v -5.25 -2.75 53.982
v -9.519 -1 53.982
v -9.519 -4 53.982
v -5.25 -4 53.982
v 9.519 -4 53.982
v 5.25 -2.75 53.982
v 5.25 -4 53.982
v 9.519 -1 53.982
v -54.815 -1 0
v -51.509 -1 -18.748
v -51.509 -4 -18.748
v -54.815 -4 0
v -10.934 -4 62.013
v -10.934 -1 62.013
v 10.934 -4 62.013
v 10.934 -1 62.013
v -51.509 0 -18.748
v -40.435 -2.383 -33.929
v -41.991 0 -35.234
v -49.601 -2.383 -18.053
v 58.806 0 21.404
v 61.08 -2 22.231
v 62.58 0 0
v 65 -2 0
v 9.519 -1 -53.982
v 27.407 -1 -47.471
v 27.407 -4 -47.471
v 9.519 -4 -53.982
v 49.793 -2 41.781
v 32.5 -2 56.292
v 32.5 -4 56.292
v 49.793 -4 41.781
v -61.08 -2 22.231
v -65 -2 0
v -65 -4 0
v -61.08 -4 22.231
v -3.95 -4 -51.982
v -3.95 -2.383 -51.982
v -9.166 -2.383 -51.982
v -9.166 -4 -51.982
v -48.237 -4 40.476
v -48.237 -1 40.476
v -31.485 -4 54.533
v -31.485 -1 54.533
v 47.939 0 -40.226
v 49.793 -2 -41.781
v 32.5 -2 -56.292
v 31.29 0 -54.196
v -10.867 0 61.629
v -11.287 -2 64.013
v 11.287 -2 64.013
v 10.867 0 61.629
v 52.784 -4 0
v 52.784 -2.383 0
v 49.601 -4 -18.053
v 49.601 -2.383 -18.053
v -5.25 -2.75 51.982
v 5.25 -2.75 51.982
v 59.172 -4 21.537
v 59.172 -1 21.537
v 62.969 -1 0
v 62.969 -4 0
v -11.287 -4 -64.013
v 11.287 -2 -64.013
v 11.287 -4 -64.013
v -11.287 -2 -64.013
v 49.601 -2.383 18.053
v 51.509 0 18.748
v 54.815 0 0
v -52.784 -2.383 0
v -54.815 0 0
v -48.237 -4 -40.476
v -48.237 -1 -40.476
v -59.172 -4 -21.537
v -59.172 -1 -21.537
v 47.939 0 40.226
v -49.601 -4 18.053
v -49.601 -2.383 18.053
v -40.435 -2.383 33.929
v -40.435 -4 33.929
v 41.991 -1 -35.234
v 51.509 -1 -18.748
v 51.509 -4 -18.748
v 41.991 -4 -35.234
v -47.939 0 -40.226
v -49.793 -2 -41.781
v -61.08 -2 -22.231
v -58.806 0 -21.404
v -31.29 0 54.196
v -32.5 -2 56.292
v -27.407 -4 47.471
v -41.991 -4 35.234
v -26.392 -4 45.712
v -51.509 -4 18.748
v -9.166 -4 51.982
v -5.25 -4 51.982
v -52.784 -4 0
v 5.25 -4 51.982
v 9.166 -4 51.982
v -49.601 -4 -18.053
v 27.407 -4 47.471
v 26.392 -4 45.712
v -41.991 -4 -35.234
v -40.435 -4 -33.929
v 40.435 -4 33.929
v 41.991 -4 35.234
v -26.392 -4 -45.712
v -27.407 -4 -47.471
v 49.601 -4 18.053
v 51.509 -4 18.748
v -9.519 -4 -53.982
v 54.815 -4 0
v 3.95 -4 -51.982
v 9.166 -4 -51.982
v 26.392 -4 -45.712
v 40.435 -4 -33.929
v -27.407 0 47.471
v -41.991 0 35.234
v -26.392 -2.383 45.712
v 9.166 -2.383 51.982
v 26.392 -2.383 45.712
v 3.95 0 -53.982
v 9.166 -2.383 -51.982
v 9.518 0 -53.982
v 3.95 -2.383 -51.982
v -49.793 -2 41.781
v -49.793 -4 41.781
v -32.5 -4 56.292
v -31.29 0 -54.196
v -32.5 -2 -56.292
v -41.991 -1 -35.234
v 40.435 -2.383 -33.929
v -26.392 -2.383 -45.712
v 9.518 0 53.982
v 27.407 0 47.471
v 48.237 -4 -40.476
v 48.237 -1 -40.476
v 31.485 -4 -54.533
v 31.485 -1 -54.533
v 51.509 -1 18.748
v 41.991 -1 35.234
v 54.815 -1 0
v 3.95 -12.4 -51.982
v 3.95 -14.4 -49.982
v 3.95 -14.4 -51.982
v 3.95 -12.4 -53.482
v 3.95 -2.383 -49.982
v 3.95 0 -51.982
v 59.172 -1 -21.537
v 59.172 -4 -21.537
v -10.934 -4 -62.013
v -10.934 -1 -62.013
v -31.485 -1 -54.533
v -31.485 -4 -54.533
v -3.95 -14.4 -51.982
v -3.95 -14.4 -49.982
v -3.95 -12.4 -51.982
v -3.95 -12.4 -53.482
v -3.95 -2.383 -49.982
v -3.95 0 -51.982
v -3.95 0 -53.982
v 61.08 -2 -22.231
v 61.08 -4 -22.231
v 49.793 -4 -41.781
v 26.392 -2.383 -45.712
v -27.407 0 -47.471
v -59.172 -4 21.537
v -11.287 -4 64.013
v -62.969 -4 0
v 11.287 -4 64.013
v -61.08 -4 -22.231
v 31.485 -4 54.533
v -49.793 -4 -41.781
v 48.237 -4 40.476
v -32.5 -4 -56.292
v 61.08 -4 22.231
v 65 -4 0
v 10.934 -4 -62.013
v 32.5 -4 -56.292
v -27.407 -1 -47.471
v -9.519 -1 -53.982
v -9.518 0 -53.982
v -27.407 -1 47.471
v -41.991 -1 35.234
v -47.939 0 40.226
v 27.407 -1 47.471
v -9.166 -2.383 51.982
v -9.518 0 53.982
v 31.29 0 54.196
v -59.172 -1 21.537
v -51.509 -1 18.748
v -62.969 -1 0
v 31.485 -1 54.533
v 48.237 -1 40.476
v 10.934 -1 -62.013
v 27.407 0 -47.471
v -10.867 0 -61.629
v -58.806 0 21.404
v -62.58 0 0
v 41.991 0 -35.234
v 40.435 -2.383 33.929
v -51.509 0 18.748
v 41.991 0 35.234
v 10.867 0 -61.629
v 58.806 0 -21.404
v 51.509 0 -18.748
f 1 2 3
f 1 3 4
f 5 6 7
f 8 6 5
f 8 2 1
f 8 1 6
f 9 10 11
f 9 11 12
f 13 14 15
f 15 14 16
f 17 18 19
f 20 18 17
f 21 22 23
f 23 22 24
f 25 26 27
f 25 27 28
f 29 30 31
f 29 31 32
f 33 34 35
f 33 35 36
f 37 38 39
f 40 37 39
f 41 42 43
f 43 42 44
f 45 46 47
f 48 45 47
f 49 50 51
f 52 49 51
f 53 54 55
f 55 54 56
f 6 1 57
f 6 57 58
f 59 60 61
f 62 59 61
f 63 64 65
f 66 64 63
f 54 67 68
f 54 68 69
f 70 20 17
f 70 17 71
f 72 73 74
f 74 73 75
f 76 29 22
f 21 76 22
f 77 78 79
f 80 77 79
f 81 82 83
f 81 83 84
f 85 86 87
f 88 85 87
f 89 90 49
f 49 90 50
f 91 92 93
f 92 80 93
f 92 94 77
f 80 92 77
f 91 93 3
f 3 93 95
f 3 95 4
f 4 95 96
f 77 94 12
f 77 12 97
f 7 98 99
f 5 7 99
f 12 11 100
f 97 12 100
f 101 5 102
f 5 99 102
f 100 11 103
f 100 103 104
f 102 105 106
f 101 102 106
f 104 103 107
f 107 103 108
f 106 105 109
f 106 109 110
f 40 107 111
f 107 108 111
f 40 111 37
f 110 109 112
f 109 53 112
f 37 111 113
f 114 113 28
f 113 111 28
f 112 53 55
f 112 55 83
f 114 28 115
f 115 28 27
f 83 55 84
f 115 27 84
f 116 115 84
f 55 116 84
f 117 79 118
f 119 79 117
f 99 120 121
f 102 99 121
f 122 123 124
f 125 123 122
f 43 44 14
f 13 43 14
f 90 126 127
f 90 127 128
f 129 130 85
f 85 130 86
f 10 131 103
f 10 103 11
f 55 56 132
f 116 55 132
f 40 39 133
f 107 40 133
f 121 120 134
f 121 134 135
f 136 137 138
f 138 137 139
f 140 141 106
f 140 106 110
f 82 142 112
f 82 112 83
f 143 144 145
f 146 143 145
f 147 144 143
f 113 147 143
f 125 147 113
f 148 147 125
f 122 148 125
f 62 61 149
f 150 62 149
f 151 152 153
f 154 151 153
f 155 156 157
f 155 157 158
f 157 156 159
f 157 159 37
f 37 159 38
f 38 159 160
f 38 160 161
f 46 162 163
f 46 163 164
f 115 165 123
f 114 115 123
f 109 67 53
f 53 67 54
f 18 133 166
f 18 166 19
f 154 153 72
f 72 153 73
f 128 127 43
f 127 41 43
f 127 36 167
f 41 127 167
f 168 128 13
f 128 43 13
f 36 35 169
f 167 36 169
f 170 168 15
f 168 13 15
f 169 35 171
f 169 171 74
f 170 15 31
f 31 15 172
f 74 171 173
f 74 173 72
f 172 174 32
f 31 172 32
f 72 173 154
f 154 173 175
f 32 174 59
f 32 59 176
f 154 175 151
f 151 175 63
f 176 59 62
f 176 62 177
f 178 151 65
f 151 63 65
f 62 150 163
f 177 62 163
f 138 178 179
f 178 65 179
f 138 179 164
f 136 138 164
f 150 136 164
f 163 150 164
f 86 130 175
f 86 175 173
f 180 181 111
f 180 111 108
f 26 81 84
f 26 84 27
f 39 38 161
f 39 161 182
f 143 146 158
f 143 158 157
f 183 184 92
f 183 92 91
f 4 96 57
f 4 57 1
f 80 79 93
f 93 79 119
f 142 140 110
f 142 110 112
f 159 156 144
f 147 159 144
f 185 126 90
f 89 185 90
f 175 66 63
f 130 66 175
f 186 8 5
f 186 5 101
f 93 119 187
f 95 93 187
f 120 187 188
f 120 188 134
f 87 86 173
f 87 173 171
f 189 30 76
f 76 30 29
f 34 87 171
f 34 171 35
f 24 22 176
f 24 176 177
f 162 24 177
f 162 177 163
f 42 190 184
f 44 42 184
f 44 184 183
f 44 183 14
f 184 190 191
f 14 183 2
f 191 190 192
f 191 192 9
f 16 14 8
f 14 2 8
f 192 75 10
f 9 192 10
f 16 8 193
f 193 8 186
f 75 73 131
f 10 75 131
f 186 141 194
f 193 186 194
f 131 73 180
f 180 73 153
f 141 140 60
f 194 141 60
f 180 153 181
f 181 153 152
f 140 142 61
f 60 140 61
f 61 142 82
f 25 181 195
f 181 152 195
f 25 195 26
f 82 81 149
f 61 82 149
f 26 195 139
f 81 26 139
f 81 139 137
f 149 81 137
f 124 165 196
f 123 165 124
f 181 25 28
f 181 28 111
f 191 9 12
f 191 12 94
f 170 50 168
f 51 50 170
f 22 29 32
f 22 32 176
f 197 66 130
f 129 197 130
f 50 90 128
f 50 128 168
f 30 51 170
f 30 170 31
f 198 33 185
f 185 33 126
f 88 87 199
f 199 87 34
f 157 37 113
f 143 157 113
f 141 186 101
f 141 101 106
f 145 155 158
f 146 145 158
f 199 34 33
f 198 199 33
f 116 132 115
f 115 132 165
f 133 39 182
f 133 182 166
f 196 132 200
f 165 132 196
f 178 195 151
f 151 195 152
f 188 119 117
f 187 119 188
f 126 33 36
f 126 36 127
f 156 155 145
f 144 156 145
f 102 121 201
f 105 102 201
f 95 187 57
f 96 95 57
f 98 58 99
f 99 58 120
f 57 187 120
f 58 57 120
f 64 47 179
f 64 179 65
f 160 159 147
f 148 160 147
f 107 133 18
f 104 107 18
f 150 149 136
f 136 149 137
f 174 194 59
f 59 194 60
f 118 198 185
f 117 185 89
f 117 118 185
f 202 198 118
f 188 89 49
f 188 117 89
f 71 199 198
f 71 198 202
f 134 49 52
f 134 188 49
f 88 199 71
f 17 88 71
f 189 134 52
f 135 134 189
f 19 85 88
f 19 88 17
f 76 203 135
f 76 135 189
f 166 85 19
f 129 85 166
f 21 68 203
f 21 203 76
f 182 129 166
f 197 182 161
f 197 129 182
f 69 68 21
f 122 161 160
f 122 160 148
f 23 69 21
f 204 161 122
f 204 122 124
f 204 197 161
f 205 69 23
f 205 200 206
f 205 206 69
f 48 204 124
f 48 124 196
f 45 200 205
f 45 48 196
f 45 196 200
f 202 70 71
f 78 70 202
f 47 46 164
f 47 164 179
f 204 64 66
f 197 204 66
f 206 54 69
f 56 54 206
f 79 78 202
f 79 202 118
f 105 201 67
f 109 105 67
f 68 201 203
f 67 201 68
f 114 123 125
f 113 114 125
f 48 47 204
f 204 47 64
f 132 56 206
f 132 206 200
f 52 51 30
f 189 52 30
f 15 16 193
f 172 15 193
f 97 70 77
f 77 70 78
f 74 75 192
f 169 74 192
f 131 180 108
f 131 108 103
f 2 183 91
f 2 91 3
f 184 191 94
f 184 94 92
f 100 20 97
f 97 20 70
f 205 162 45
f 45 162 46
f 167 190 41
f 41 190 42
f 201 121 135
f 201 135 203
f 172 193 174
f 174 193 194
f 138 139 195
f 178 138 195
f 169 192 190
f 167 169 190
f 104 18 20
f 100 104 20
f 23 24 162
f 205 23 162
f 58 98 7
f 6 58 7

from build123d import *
from OCP.BRepFilletAPI import BRepFilletAPI_MakeChamfer

# Parameters (mm, degrees)
BOSS_EXTRUDE1_DEPTH = 1
BOSS_EXTRUDE3_DEPTH = 4
CUT_EXTRUDE2_DEPTH  = 1
BOSS_EXTRUDE5_DEPTH = 4
SKETCH6_W           = 10.5
SKETCH6_H           = 2
CUT_EXTRUDE3_DEPTH  = 1.25
SKETCH7_W           = 7.9
SKETCH7_H           = 14.4
BOSS_EXTRUDE6_DEPTH = 2
CHAMFER1_SIZE       = 2.383507185
CHAMFER1_SIZE_2     = 2
BOSS_EXTRUDE7_DEPTH = 7.9


with BuildPart() as part:
    # Sketch1 → Boss-Extrude1 (new body)
    with BuildSketch(Plane(origin=(0, 0, 0), x_dir=(1, 0, 0), z_dir=(0, 1, 0))):
        Polygon((62.969146776, 0), (59.171642563, 21.536716606), (48.237164976, 40.47578734), (31.484573388, 54.532880763), (10.934477587, 62.012503946), (-10.934477587, 62.012503946), (-31.484573388, 54.532880763), (-48.237164976, 40.47578734), (-59.171642563, 21.536716606), (-62.969146776, 0), (-59.171642563, -21.536716606), (-48.237164976, -40.47578734), (-31.484573388, -54.532880763), (-10.934477587, -62.012503946), (10.934477587, -62.012503946), (31.484573388, -54.532880763), (48.237164976, -40.47578734), (59.171642563, -21.536716606), align=None)
    extrude(amount=-BOSS_EXTRUDE1_DEPTH)

    # Sketch3 → Cut-Extrude2 (cut)
    with BuildSketch(Plane(origin=(0, 0, 0), x_dir=(1, 0, 0), z_dir=(0, 1, 0))):
        Polygon((54.814880655, 0), (51.509138861, 18.747793338), (41.990634726, 35.234326111), (27.407440327, 47.471079153), (9.518504135, 53.982119449), (-9.518504135, 53.982119449), (-27.407440328, 47.471079153), (-41.990634726, 35.234326111), (-51.509138861, 18.747793338), (-54.814880655, 0), (-51.509138861, -18.747793338), (-41.990634726, -35.234326111), (-27.407440327, -47.471079153), (-9.518504135, -53.982119449), (9.518504135, -53.982119449), (27.407440328, -47.471079153), (41.990634726, -35.234326111), (51.509138861, -18.747793338), align=None)
    extrude(amount=-CUT_EXTRUDE2_DEPTH, mode=Mode.SUBTRACT)


with BuildPart() as body_2:
    # Sketch1<7> → Boss-Extrude3 (new body)
    with BuildSketch(Plane(origin=(0, 0, 0), x_dir=(1, 0, 0), z_dir=(0, 1, 0))):
        Polygon((65, 0), (61.080020351, 22.231309316), (49.792888803, 41.78119463), (32.5, 56.291651246), (11.287131548, 64.012503946), (-11.287131548, 64.012503946), (-32.5, 56.291651246), (-49.792888803, 41.78119463), (-61.080020351, 22.231309316), (-65, 0), (-61.080020351, -22.231309316), (-49.792888803, -41.78119463), (-32.5, -56.291651246), (-11.287131548, -64.012503946), (11.287131548, -64.012503946), (32.5, -56.291651246), (49.792888803, -41.78119463), (61.080020351, -22.231309316), align=None)
        Polygon((62.969146776, 0), (59.171642563, 21.536716606), (48.237164976, 40.47578734), (31.484573388, 54.532880763), (10.934477587, 62.012503946), (-10.934477587, 62.012503946), (-31.484573388, 54.532880763), (-48.237164976, 40.47578734), (-59.171642563, 21.536716606), (-62.969146776, 0), (-59.171642563, -21.536716606), (-48.237164976, -40.47578734), (-31.484573388, -54.532880763), (-10.934477587, -62.012503946), (10.934477587, -62.012503946), (31.484573388, -54.532880763), (48.237164976, -40.47578734), (59.171642563, -21.536716606), align=None, mode=Mode.SUBTRACT)
    extrude(amount=-BOSS_EXTRUDE3_DEPTH)


    add(part.part)  # Boss-Extrude5 merges part
    # Sketch5 → Boss-Extrude5 (add)
    with BuildSketch(Plane(origin=(0, 0, 0), x_dir=(1, 0, 0), z_dir=(0, 1, 0))):
        Polygon((54.814880655, 0), (51.509138861, 18.747793338), (41.990634726, 35.234326111), (27.407440328, 47.471079153), (9.518504135, 53.982119449), (-9.518504135, 53.982119449), (-27.407440328, 47.471079153), (-41.990634726, 35.234326111), (-51.509138861, 18.747793338), (-54.814880655, 0), (-51.509138861, -18.747793338), (-41.990634726, -35.234326111), (-27.407440328, -47.471079153), (-9.518504135, -53.982119449), (9.518504135, -53.982119449), (27.407440328, -47.471079153), (41.990634726, -35.234326111), (51.509138861, -18.747793338), align=None)
        Polygon((52.784027431, 0), (49.600761072, 18.053200627), (40.434910899, 33.928918822), (26.392013716, 45.712308669), (9.165850173, 51.982119449), (-9.165850173, 51.982119449), (-26.392013716, 45.712308669), (-40.434910899, 33.928918822), (-49.600761072, 18.053200627), (-52.784027431, 0), (-49.600761072, -18.053200627), (-40.434910899, -33.928918822), (-26.392013716, -45.712308669), (-9.165850173, -51.982119449), (9.165850173, -51.982119449), (26.392013716, -45.712308669), (40.434910899, -33.928918822), (49.600761072, -18.053200627), align=None, mode=Mode.SUBTRACT)
    extrude(amount=-BOSS_EXTRUDE5_DEPTH)

    # Sketch6 → Cut-Extrude3 (cut)
    with BuildSketch(Plane.XZ.offset(4)):
        with Locations((0, 52.982119449)):
            Rectangle(SKETCH6_W, SKETCH6_H)
    extrude(amount=-CUT_EXTRUDE3_DEPTH, mode=Mode.SUBTRACT)

    # Sketch7 → Boss-Extrude6 (add)
    with BuildSketch(Plane.XY.offset(-51.982119449)):
        with Locations((0, -7.2)):
            Rectangle(SKETCH7_W, SKETCH7_H)
    extrude(amount=BOSS_EXTRUDE6_DEPTH)

    # Chamfer1
    chamfer1_edges_1 = [body_2.edges().sort_by_distance(p)[0] for p in [
        (55.436454577, 0, 32.006251973),
    ]]
    chamfer1_side_1 = [body_2.faces().sort_by_distance(p)[0] for p in [
        (55.401813561, 0, 31.986251973),
    ]]
    chamfer1_edges_2 = [body_2.edges().sort_by_distance(p)[0] for p in [
        (41.146444401, 0, 49.036422938),
    ]]
    chamfer1_side_2 = [body_2.faces().sort_by_distance(p)[0] for p in [
        (41.120732897, 0, 49.00578116),
    ]]
    chamfer1_edges_3 = [body_2.edges().sort_by_distance(p)[0] for p in [
        (21.893565774, 0, 60.152077596),
    ]]
    chamfer1_side_3 = [body_2.faces().sort_by_distance(p)[0] for p in [
        (21.879884968, 0, 60.114489891),
    ]]
    chamfer1_edges_4 = [body_2.edges().sort_by_distance(p)[0] for p in [
        (0, 0, 64.012503946),
    ]]
    chamfer1_side_4 = [body_2.faces().sort_by_distance(p)[0] for p in [
        (0, 0, 63.972503946),
    ]]
    chamfer1_edges_5 = [body_2.edges().sort_by_distance(p)[0] for p in [
        (-21.893565774, 0, 60.152077596),
    ]]
    chamfer1_side_5 = [body_2.faces().sort_by_distance(p)[0] for p in [
        (-21.879884968, 0, 60.114489891),
    ]]
    chamfer1_edges_6 = [body_2.edges().sort_by_distance(p)[0] for p in [
        (-41.146444401, 0, 49.036422938),
    ]]
    chamfer1_side_6 = [body_2.faces().sort_by_distance(p)[0] for p in [
        (-41.120732897, 0, 49.00578116),
    ]]
    chamfer1_edges_7 = [body_2.edges().sort_by_distance(p)[0] for p in [
        (51.192394252, 0, -9.026600314),
    ]]
    chamfer1_side_7 = [body_2.faces().sort_by_distance(p)[0] for p in [
        (51.231786562, 0, -9.033546241),
    ]]
    chamfer1_edges_8 = [body_2.edges().sort_by_distance(p)[0] for p in [
        (45.017835986, 0, -25.991059725),
    ]]
    chamfer1_side_8 = [body_2.faces().sort_by_distance(p)[0] for p in [
        (45.052477002, 0, -26.011059725),
    ]]
    chamfer1_edges_9 = [body_2.edges().sort_by_distance(p)[0] for p in [
        (33.413462307, 0, -39.820613746),
    ]]
    chamfer1_side_9 = [body_2.faces().sort_by_distance(p)[0] for p in [
        (33.439173812, 0, -39.851255524),
    ]]
    chamfer1_edges_10 = [body_2.edges().sort_by_distance(p)[0] for p in [
        (17.778931944, 0, -48.847214059),
    ]]
    chamfer1_side_10 = [body_2.faces().sort_by_distance(p)[0] for p in [
        (17.79261275, 0, -48.884801764),
    ]]
    chamfer1_edges_11 = [body_2.edges().sort_by_distance(p)[0] for p in [
        (6.557925087, 0, -51.982119449),
    ]]
    chamfer1_side_11 = [body_2.faces().sort_by_distance(p)[0] for p in [
        (6.557925087, 0, -52.022119449),
    ]]
    chamfer1_edges_12 = [body_2.edges().sort_by_distance(p)[0] for p in [
        (-17.778931944, 0, -48.847214059),
    ]]
    chamfer1_side_12 = [body_2.faces().sort_by_distance(p)[0] for p in [
        (-17.79261275, 0, -48.884801764),
    ]]
    chamfer1_edges_13 = [body_2.edges().sort_by_distance(p)[0] for p in [
        (-33.413462307, 0, -39.820613746),
    ]]
    chamfer1_side_13 = [body_2.faces().sort_by_distance(p)[0] for p in [
        (-33.439173812, 0, -39.851255524),
    ]]
    chamfer1_edges_14 = [body_2.edges().sort_by_distance(p)[0] for p in [
        (-45.017835986, 0, -25.991059725),
    ]]
    chamfer1_side_14 = [body_2.faces().sort_by_distance(p)[0] for p in [
        (-45.052477002, 0, -26.011059725),
    ]]
    chamfer1_edges_15 = [body_2.edges().sort_by_distance(p)[0] for p in [
        (-51.192394252, 0, -9.026600314),
    ]]
    chamfer1_side_15 = [body_2.faces().sort_by_distance(p)[0] for p in [
        (-51.231786562, 0, -9.033546241),
    ]]
    chamfer1_edges_16 = [body_2.edges().sort_by_distance(p)[0] for p in [
        (-51.192394252, 0, 9.026600314),
    ]]
    chamfer1_side_16 = [body_2.faces().sort_by_distance(p)[0] for p in [
        (-51.231786562, 0, 9.033546241),
    ]]
    chamfer1_edges_17 = [body_2.edges().sort_by_distance(p)[0] for p in [
        (-45.017835986, 0, 25.991059725),
    ]]
    chamfer1_side_17 = [body_2.faces().sort_by_distance(p)[0] for p in [
        (-45.052477002, 0, 26.011059725),
    ]]
    chamfer1_edges_18 = [body_2.edges().sort_by_distance(p)[0] for p in [
        (-33.413462307, 0, 39.820613746),
    ]]
    chamfer1_side_18 = [body_2.faces().sort_by_distance(p)[0] for p in [
        (-33.439173812, 0, 39.851255524),
    ]]
    chamfer1_edges_19 = [body_2.edges().sort_by_distance(p)[0] for p in [
        (-17.778931944, 0, 48.847214059),
    ]]
    chamfer1_side_19 = [body_2.faces().sort_by_distance(p)[0] for p in [
        (-17.79261275, 0, 48.884801764),
    ]]
    chamfer1_edges_20 = [body_2.edges().sort_by_distance(p)[0] for p in [
        (0, 0, 51.982119449),
    ]]
    chamfer1_side_20 = [body_2.faces().sort_by_distance(p)[0] for p in [
        (0, 0, 52.022119449),
    ]]
    chamfer1_edges_21 = [body_2.edges().sort_by_distance(p)[0] for p in [
        (17.778931944, 0, 48.847214059),
    ]]
    chamfer1_side_21 = [body_2.faces().sort_by_distance(p)[0] for p in [
        (17.79261275, 0, 48.884801764),
    ]]
    chamfer1_edges_22 = [body_2.edges().sort_by_distance(p)[0] for p in [
        (33.413462307, 0, 39.820613746),
    ]]
    chamfer1_side_22 = [body_2.faces().sort_by_distance(p)[0] for p in [
        (33.439173812, 0, 39.851255524),
    ]]
    chamfer1_edges_23 = [body_2.edges().sort_by_distance(p)[0] for p in [
        (45.017835986, 0, 25.991059725),
    ]]
    chamfer1_side_23 = [body_2.faces().sort_by_distance(p)[0] for p in [
        (45.052477002, 0, 26.011059725),
    ]]
    chamfer1_edges_24 = [body_2.edges().sort_by_distance(p)[0] for p in [
        (51.192394252, 0, 9.026600314),
    ]]
    chamfer1_side_24 = [body_2.faces().sort_by_distance(p)[0] for p in [
        (51.231786562, 0, 9.033546241),
    ]]
    chamfer1_edges_25 = [body_2.edges().sort_by_distance(p)[0] for p in [
        (-6.557925087, 0, -51.982119449),
    ]]
    chamfer1_side_25 = [body_2.faces().sort_by_distance(p)[0] for p in [
        (-6.557925087, 0, -52.022119449),
    ]]
    chamfer1_edges_26 = [body_2.edges().sort_by_distance(p)[0] for p in [
        (0, 0, -49.982119449),
    ]]
    chamfer1_side_26 = [body_2.faces().sort_by_distance(p)[0] for p in [
        (0, 0, -50.022119449),
    ]]
    chamfer1_edges_27 = [body_2.edges().sort_by_distance(p)[0] for p in [
        (-55.436454577, 0, 32.006251973),
    ]]
    chamfer1_side_27 = [body_2.faces().sort_by_distance(p)[0] for p in [
        (-55.401813561, 0, 31.986251973),
    ]]
    chamfer1_edges_28 = [body_2.edges().sort_by_distance(p)[0] for p in [
        (-63.040010176, 0, 11.115654658),
    ]]
    chamfer1_side_28 = [body_2.faces().sort_by_distance(p)[0] for p in [
        (-63.000617865, 0, 11.108708731),
    ]]
    chamfer1_edges_29 = [body_2.edges().sort_by_distance(p)[0] for p in [
        (-63.040010176, 0, -11.115654658),
    ]]
    chamfer1_side_29 = [body_2.faces().sort_by_distance(p)[0] for p in [
        (-63.000617865, 0, -11.108708731),
    ]]
    chamfer1_edges_30 = [body_2.edges().sort_by_distance(p)[0] for p in [
        (-55.436454577, 0, -32.006251973),
    ]]
    chamfer1_side_30 = [body_2.faces().sort_by_distance(p)[0] for p in [
        (-55.401813561, 0, -31.986251973),
    ]]
    chamfer1_edges_31 = [body_2.edges().sort_by_distance(p)[0] for p in [
        (-41.146444401, 0, -49.036422938),
    ]]
    chamfer1_side_31 = [body_2.faces().sort_by_distance(p)[0] for p in [
        (-41.120732897, 0, -49.00578116),
    ]]
    chamfer1_edges_32 = [body_2.edges().sort_by_distance(p)[0] for p in [
        (-21.893565774, 0, -60.152077596),
    ]]
    chamfer1_side_32 = [body_2.faces().sort_by_distance(p)[0] for p in [
        (-21.879884968, 0, -60.114489891),
    ]]
    chamfer1_edges_33 = [body_2.edges().sort_by_distance(p)[0] for p in [
        (0, 0, -64.012503946),
    ]]
    chamfer1_side_33 = [body_2.faces().sort_by_distance(p)[0] for p in [
        (0, 0, -63.972503946),
    ]]
    chamfer1_edges_34 = [body_2.edges().sort_by_distance(p)[0] for p in [
        (21.893565774, 0, -60.152077596),
    ]]
    chamfer1_side_34 = [body_2.faces().sort_by_distance(p)[0] for p in [
        (21.879884968, 0, -60.114489891),
    ]]
    chamfer1_edges_35 = [body_2.edges().sort_by_distance(p)[0] for p in [
        (41.146444401, 0, -49.036422938),
    ]]
    chamfer1_side_35 = [body_2.faces().sort_by_distance(p)[0] for p in [
        (41.120732897, 0, -49.00578116),
    ]]
    chamfer1_edges_36 = [body_2.edges().sort_by_distance(p)[0] for p in [
        (55.436454577, 0, -32.006251973),
    ]]
    chamfer1_side_36 = [body_2.faces().sort_by_distance(p)[0] for p in [
        (55.401813561, 0, -31.986251973),
    ]]
    chamfer1_edges_37 = [body_2.edges().sort_by_distance(p)[0] for p in [
        (63.040010176, 0, -11.115654658),
    ]]
    chamfer1_side_37 = [body_2.faces().sort_by_distance(p)[0] for p in [
        (63.000617865, 0, -11.108708731),
    ]]
    chamfer1_edges_38 = [body_2.edges().sort_by_distance(p)[0] for p in [
        (63.040010176, 0, 11.115654658),
    ]]
    chamfer1_side_38 = [body_2.faces().sort_by_distance(p)[0] for p in [
        (63.000617865, 0, 11.108708731),
    ]]
    chamfer1 = BRepFilletAPI_MakeChamfer(body_2.part.solid().wrapped)
    for e in chamfer1_edges_1:
        chamfer1.Add(CHAMFER1_SIZE - 0.0001, CHAMFER1_SIZE_2 - 0.0001, e.wrapped, chamfer1_side_1[0].wrapped)
    for e in chamfer1_edges_2:
        chamfer1.Add(CHAMFER1_SIZE - 0.0001, CHAMFER1_SIZE_2 - 0.0001, e.wrapped, chamfer1_side_2[0].wrapped)
    for e in chamfer1_edges_3:
        chamfer1.Add(CHAMFER1_SIZE - 0.0001, CHAMFER1_SIZE_2 - 0.0001, e.wrapped, chamfer1_side_3[0].wrapped)
    for e in chamfer1_edges_4:
        chamfer1.Add(CHAMFER1_SIZE - 0.0001, CHAMFER1_SIZE_2 - 0.0001, e.wrapped, chamfer1_side_4[0].wrapped)
    for e in chamfer1_edges_5:
        chamfer1.Add(CHAMFER1_SIZE - 0.0001, CHAMFER1_SIZE_2 - 0.0001, e.wrapped, chamfer1_side_5[0].wrapped)
    for e in chamfer1_edges_6:
        chamfer1.Add(CHAMFER1_SIZE - 0.0001, CHAMFER1_SIZE_2 - 0.0001, e.wrapped, chamfer1_side_6[0].wrapped)
    for e in chamfer1_edges_7:
        chamfer1.Add(CHAMFER1_SIZE_2 - 0.0001, CHAMFER1_SIZE - 0.0001, e.wrapped, chamfer1_side_7[0].wrapped)
    for e in chamfer1_edges_8:
        chamfer1.Add(CHAMFER1_SIZE_2 - 0.0001, CHAMFER1_SIZE - 0.0001, e.wrapped, chamfer1_side_8[0].wrapped)
    for e in chamfer1_edges_9:
        chamfer1.Add(CHAMFER1_SIZE_2 - 0.0001, CHAMFER1_SIZE - 0.0001, e.wrapped, chamfer1_side_9[0].wrapped)
    for e in chamfer1_edges_10:
        chamfer1.Add(CHAMFER1_SIZE_2 - 0.0001, CHAMFER1_SIZE - 0.0001, e.wrapped, chamfer1_side_10[0].wrapped)
    for e in chamfer1_edges_11:
        chamfer1.Add(CHAMFER1_SIZE_2 - 0.0001, CHAMFER1_SIZE - 0.0001, e.wrapped, chamfer1_side_11[0].wrapped)
    for e in chamfer1_edges_12:
        chamfer1.Add(CHAMFER1_SIZE_2 - 0.0001, CHAMFER1_SIZE - 0.0001, e.wrapped, chamfer1_side_12[0].wrapped)
    for e in chamfer1_edges_13:
        chamfer1.Add(CHAMFER1_SIZE_2 - 0.0001, CHAMFER1_SIZE - 0.0001, e.wrapped, chamfer1_side_13[0].wrapped)
    for e in chamfer1_edges_14:
        chamfer1.Add(CHAMFER1_SIZE_2 - 0.0001, CHAMFER1_SIZE - 0.0001, e.wrapped, chamfer1_side_14[0].wrapped)
    for e in chamfer1_edges_15:
        chamfer1.Add(CHAMFER1_SIZE_2 - 0.0001, CHAMFER1_SIZE - 0.0001, e.wrapped, chamfer1_side_15[0].wrapped)
    for e in chamfer1_edges_16:
        chamfer1.Add(CHAMFER1_SIZE_2 - 0.0001, CHAMFER1_SIZE - 0.0001, e.wrapped, chamfer1_side_16[0].wrapped)
    for e in chamfer1_edges_17:
        chamfer1.Add(CHAMFER1_SIZE_2 - 0.0001, CHAMFER1_SIZE - 0.0001, e.wrapped, chamfer1_side_17[0].wrapped)
    for e in chamfer1_edges_18:
        chamfer1.Add(CHAMFER1_SIZE_2 - 0.0001, CHAMFER1_SIZE - 0.0001, e.wrapped, chamfer1_side_18[0].wrapped)
    for e in chamfer1_edges_19:
        chamfer1.Add(CHAMFER1_SIZE_2 - 0.0001, CHAMFER1_SIZE - 0.0001, e.wrapped, chamfer1_side_19[0].wrapped)
    for e in chamfer1_edges_20:
        chamfer1.Add(CHAMFER1_SIZE_2 - 0.0001, CHAMFER1_SIZE - 0.0001, e.wrapped, chamfer1_side_20[0].wrapped)
    for e in chamfer1_edges_21:
        chamfer1.Add(CHAMFER1_SIZE_2 - 0.0001, CHAMFER1_SIZE - 0.0001, e.wrapped, chamfer1_side_21[0].wrapped)
    for e in chamfer1_edges_22:
        chamfer1.Add(CHAMFER1_SIZE_2 - 0.0001, CHAMFER1_SIZE - 0.0001, e.wrapped, chamfer1_side_22[0].wrapped)
    for e in chamfer1_edges_23:
        chamfer1.Add(CHAMFER1_SIZE_2 - 0.0001, CHAMFER1_SIZE - 0.0001, e.wrapped, chamfer1_side_23[0].wrapped)
    for e in chamfer1_edges_24:
        chamfer1.Add(CHAMFER1_SIZE_2 - 0.0001, CHAMFER1_SIZE - 0.0001, e.wrapped, chamfer1_side_24[0].wrapped)
    for e in chamfer1_edges_25:
        chamfer1.Add(CHAMFER1_SIZE_2 - 0.0001, CHAMFER1_SIZE - 0.0001, e.wrapped, chamfer1_side_25[0].wrapped)
    for e in chamfer1_edges_26:
        chamfer1.Add(CHAMFER1_SIZE_2 - 0.0001, CHAMFER1_SIZE - 0.0001, e.wrapped, chamfer1_side_26[0].wrapped)
    for e in chamfer1_edges_27:
        chamfer1.Add(CHAMFER1_SIZE - 0.0001, CHAMFER1_SIZE_2 - 0.0001, e.wrapped, chamfer1_side_27[0].wrapped)
    for e in chamfer1_edges_28:
        chamfer1.Add(CHAMFER1_SIZE - 0.0001, CHAMFER1_SIZE_2 - 0.0001, e.wrapped, chamfer1_side_28[0].wrapped)
    for e in chamfer1_edges_29:
        chamfer1.Add(CHAMFER1_SIZE - 0.0001, CHAMFER1_SIZE_2 - 0.0001, e.wrapped, chamfer1_side_29[0].wrapped)
    for e in chamfer1_edges_30:
        chamfer1.Add(CHAMFER1_SIZE - 0.0001, CHAMFER1_SIZE_2 - 0.0001, e.wrapped, chamfer1_side_30[0].wrapped)
    for e in chamfer1_edges_31:
        chamfer1.Add(CHAMFER1_SIZE - 0.0001, CHAMFER1_SIZE_2 - 0.0001, e.wrapped, chamfer1_side_31[0].wrapped)
    for e in chamfer1_edges_32:
        chamfer1.Add(CHAMFER1_SIZE - 0.0001, CHAMFER1_SIZE_2 - 0.0001, e.wrapped, chamfer1_side_32[0].wrapped)
    for e in chamfer1_edges_33:
        chamfer1.Add(CHAMFER1_SIZE - 0.0001, CHAMFER1_SIZE_2 - 0.0001, e.wrapped, chamfer1_side_33[0].wrapped)
    for e in chamfer1_edges_34:
        chamfer1.Add(CHAMFER1_SIZE - 0.0001, CHAMFER1_SIZE_2 - 0.0001, e.wrapped, chamfer1_side_34[0].wrapped)
    for e in chamfer1_edges_35:
        chamfer1.Add(CHAMFER1_SIZE - 0.0001, CHAMFER1_SIZE_2 - 0.0001, e.wrapped, chamfer1_side_35[0].wrapped)
    for e in chamfer1_edges_36:
        chamfer1.Add(CHAMFER1_SIZE - 0.0001, CHAMFER1_SIZE_2 - 0.0001, e.wrapped, chamfer1_side_36[0].wrapped)
    for e in chamfer1_edges_37:
        chamfer1.Add(CHAMFER1_SIZE - 0.0001, CHAMFER1_SIZE_2 - 0.0001, e.wrapped, chamfer1_side_37[0].wrapped)
    for e in chamfer1_edges_38:
        chamfer1.Add(CHAMFER1_SIZE - 0.0001, CHAMFER1_SIZE_2 - 0.0001, e.wrapped, chamfer1_side_38[0].wrapped)
    add(Compound.cast(chamfer1.Shape()), mode=Mode.REPLACE)  # a hair under: the kernel refuses the full size

    # Sketch9 → Boss-Extrude7 (add)
    with BuildSketch(Plane.ZY.offset(3.95)):
        Polygon((-51.982119449, -14.4), (-53.482119449, -12.4), (-51.982119449, -12.4), align=None)
    extrude(amount=-BOSS_EXTRUDE7_DEPTH)


solid = body_2.part
